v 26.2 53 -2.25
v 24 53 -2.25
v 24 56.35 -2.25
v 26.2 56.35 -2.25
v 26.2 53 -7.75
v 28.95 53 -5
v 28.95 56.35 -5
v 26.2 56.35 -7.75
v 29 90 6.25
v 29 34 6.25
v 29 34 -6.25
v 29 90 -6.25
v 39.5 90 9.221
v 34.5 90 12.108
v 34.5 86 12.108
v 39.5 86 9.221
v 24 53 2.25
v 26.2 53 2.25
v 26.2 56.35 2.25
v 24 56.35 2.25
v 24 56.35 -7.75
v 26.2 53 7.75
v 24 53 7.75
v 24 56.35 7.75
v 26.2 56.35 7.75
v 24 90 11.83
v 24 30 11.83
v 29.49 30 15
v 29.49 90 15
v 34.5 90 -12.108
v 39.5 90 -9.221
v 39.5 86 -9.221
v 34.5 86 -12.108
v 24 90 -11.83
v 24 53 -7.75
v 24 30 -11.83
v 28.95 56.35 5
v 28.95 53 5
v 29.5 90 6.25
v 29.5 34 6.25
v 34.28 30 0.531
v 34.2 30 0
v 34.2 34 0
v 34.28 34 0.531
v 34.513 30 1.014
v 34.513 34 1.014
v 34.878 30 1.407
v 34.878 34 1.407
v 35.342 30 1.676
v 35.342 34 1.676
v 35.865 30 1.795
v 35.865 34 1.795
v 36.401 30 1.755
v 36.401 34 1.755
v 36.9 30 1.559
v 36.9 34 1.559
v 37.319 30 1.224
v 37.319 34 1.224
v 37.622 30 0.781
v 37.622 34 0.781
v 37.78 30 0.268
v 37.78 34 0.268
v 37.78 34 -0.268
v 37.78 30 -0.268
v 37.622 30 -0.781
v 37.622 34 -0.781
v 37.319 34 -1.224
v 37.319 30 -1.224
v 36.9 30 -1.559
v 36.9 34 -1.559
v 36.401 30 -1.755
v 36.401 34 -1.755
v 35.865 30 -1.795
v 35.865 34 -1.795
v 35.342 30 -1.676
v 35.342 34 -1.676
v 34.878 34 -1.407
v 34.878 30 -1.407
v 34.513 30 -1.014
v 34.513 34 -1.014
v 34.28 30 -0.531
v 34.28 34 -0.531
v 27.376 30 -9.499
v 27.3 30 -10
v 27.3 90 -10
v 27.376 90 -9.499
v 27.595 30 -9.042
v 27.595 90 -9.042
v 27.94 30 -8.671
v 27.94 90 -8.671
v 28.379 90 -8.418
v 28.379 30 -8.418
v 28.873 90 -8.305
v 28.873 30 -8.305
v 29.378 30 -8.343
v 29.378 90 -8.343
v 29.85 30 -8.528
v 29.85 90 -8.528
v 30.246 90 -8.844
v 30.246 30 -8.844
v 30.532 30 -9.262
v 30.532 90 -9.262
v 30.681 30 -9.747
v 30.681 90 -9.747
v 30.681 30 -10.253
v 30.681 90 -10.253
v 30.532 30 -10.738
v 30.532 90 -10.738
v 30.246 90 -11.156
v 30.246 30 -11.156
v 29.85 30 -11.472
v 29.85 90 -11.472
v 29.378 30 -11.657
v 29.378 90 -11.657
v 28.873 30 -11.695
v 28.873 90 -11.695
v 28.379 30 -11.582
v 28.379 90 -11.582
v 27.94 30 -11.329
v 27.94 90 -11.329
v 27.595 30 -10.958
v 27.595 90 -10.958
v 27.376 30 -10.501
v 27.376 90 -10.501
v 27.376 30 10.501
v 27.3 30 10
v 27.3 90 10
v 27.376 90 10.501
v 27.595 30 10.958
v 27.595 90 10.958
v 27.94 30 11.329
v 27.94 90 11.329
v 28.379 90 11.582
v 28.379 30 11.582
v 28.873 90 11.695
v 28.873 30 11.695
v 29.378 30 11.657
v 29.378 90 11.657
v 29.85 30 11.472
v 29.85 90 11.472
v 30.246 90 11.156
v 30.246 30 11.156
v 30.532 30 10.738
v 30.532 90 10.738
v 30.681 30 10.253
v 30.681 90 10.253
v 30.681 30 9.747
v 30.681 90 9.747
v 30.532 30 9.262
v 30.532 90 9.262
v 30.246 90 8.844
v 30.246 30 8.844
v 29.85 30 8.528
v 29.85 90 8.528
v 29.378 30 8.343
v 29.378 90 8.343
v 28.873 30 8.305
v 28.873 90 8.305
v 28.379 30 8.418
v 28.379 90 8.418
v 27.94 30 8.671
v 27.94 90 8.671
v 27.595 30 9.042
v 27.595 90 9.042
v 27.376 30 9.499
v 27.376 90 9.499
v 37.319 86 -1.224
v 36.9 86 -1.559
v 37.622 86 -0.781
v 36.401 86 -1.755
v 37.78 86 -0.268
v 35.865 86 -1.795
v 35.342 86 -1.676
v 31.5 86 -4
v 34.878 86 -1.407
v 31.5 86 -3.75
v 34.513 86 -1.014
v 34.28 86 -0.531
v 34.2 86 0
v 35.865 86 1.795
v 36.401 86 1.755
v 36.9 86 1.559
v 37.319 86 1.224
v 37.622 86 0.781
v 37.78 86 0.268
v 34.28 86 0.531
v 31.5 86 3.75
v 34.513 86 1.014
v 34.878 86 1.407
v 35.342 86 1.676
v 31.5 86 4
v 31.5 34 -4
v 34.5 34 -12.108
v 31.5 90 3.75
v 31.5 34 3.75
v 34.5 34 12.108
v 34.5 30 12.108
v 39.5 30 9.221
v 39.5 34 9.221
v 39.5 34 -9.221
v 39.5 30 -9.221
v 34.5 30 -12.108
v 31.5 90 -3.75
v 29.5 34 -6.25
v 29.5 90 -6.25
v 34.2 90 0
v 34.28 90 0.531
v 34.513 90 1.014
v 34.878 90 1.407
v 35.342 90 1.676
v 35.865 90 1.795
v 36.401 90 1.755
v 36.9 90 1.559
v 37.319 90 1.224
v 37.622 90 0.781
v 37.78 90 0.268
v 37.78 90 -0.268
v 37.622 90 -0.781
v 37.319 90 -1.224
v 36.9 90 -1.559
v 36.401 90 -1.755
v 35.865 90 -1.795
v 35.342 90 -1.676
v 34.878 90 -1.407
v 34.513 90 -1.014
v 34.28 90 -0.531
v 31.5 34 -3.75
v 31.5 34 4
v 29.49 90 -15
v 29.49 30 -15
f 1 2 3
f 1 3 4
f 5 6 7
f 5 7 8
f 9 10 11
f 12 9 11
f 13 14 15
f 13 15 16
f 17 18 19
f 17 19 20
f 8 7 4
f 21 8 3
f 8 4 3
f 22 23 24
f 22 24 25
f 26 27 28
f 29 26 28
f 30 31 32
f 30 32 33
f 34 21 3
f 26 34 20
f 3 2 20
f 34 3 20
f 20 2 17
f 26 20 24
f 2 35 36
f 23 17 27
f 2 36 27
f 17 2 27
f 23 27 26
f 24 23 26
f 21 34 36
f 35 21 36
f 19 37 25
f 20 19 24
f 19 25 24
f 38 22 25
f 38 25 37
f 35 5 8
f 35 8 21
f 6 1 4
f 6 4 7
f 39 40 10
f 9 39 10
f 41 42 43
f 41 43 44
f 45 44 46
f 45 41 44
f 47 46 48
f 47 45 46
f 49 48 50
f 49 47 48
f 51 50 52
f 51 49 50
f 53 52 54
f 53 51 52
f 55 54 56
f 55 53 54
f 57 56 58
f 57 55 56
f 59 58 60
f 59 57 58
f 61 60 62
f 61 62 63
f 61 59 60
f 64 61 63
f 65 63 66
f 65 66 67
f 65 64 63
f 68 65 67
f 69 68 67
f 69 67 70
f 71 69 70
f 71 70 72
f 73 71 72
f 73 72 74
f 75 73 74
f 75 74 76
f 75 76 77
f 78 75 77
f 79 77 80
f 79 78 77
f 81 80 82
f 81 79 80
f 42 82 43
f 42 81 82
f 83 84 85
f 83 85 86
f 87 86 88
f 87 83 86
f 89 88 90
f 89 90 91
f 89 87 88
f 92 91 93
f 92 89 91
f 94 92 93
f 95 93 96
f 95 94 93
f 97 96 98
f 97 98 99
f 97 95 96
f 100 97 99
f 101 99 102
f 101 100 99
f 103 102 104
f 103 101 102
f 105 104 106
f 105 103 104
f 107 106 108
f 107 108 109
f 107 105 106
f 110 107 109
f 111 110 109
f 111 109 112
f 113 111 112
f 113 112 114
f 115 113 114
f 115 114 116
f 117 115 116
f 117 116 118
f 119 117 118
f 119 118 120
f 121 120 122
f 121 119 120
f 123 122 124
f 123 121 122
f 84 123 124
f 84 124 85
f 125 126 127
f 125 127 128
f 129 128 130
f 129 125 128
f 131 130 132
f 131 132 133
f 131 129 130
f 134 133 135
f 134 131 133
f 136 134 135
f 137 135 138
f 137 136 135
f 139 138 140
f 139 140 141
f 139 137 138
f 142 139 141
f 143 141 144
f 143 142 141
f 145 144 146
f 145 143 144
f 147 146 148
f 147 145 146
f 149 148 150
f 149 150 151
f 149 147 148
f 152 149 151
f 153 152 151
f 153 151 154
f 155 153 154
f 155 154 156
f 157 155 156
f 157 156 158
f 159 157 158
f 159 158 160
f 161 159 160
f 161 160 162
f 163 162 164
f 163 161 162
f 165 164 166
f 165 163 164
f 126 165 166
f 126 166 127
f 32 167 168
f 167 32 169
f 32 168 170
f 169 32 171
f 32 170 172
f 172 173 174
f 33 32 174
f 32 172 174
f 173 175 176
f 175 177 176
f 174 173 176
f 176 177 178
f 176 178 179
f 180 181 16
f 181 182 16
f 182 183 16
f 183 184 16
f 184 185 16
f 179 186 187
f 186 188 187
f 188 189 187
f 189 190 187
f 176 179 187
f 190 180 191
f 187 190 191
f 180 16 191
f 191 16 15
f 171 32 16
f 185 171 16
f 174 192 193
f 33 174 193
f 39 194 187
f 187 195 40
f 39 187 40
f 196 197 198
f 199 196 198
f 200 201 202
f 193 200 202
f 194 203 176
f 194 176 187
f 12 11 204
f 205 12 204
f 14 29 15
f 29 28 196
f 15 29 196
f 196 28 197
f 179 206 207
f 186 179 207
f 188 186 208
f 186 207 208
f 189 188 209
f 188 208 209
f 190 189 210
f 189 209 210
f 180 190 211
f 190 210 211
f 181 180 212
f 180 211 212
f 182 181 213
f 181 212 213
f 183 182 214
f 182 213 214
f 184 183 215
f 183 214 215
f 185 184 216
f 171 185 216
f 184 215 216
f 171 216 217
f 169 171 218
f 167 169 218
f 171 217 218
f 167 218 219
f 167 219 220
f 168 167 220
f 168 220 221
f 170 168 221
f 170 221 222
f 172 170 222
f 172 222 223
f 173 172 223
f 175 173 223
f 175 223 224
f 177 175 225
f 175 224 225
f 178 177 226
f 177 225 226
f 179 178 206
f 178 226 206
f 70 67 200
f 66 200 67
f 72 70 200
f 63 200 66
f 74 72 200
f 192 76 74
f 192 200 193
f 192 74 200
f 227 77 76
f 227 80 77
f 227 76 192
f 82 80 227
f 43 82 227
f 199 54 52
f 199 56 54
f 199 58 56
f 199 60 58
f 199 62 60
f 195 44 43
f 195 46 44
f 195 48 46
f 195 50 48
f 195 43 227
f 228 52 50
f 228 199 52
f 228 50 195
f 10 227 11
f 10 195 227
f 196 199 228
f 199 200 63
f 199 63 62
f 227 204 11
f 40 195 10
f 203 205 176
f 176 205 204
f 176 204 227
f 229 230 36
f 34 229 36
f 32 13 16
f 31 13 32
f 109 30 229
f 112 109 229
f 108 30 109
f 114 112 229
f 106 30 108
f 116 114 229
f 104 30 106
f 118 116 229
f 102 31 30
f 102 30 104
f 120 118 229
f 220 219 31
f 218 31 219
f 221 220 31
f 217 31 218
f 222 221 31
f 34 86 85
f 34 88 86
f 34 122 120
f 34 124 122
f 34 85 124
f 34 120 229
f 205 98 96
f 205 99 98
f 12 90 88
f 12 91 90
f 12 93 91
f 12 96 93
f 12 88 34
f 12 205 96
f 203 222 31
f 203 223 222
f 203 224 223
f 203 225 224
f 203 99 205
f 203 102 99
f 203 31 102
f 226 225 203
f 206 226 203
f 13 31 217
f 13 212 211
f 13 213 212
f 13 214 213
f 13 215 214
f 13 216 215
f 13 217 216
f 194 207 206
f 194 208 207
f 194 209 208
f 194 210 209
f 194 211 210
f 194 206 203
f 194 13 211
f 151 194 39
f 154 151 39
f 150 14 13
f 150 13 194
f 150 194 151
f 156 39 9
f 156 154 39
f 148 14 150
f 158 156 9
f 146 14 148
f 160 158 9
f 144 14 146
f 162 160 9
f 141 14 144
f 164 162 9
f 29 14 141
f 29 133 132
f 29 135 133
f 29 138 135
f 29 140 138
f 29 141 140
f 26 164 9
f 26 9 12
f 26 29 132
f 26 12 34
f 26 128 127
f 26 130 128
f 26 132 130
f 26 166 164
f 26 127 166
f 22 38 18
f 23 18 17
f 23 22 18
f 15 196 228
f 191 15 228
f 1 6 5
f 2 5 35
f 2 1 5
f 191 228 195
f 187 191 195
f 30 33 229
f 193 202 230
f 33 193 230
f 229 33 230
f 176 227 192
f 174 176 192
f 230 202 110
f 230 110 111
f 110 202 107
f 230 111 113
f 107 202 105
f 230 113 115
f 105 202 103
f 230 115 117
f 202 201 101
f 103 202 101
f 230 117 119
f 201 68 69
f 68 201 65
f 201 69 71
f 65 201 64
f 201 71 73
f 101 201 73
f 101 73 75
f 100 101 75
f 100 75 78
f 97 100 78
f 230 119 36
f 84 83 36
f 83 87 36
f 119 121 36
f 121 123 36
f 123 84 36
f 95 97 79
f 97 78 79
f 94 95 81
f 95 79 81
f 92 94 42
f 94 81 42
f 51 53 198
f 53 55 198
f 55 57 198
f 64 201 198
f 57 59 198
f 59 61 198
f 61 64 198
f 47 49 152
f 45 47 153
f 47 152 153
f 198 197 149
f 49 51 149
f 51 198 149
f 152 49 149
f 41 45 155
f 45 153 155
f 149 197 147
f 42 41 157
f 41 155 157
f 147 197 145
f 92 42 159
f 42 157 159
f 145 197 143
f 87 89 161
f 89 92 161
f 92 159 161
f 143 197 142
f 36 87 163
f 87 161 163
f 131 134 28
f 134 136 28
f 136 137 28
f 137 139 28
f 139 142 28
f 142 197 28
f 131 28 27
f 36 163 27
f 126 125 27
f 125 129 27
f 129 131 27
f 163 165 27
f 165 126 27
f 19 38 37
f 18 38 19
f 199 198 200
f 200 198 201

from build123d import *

# Parameters (mm, degrees)
SKETCH161_R  = 1.8
PAD126_DEPTH = 3.35
SKETCH158_R  = 1.8
PAD123_DEPTH = 4
SKETCH159_R  = 1.8
SKETCH159_W  = 2.5
SKETCH159_H  = 13
PAD124_DEPTH = 4
SKETCH156_R  = 1.7
PAD121_DEPTH = 60


with BuildPart() as motorcageringcutout:
    # Sketch161 → Pad126 (new body)
    with BuildSketch(Plane.XZ.offset(-53)):
        with BuildLine():
            Line((-16.85, 24), (-23.5, 12.481862))
            Line((-23.5, 12.481862), (-23.5, 7.75))
            Line((-23.5, 7.75), (-26.2, 7.75))
            Line((-26.2, 7.75), (-28.95, 5))
            Line((-28.95, 5), (-26.2, 2.25))
            Line((-26.2, 2.25), (-23.5, 2.25))
            Line((-23.5, 2.25), (-23.5, -2.25))
            Line((-23.5, -2.25), (-26.2, -2.25))
            Line((-26.2, -2.25), (-28.95, -5))
            Line((-28.95, -5), (-26.2, -7.75))
            Line((-26.2, -7.75), (-23.5, -7.75))
            Line((-23.5, -7.75), (-23.5, -12.473721))
            Line((-23.5, -12.473721), (-18, -22))
            Line((-18, -22), (0, -22))
            Line((0, -18.35), (0, -22))
            ThreePointArc((0, 18.35), (-18.35, 0), (0, -18.35))
            Line((0, 24), (0, 18.35))
            Line((-16.85, 24), (0, 24))
        make_face()
        with Locations((-15, 21)):
            Circle(SKETCH161_R, mode=Mode.SUBTRACT)
        with Locations((-15, -17)):
            Circle(SKETCH161_R, mode=Mode.SUBTRACT)
    extrude(amount=-PAD126_DEPTH)


with BuildPart() as endcap:
    # Sketch158 → Pad123 (new body)
    with BuildSketch(Plane.XZ.offset(-30)):
        Polygon((-29.490381, 15), (-39.5, 9.220944), (-39.5, -9.220944), (-29.490381, -15), (-24, -11.830127), (-24, 11.830127), align=None)
        with Locations((-29, 10)):
            Circle(SKETCH158_R, mode=Mode.SUBTRACT)
        with Locations((-29, -10)):
            Circle(SKETCH158_R, mode=Mode.SUBTRACT)
        with Locations((-36, 0)):
            Circle(SKETCH158_R, mode=Mode.SUBTRACT)
    extrude(amount=-PAD123_DEPTH)


with BuildPart() as pad124:
    # Sketch159 → Pad124 (new body)
    with BuildSketch(Plane.XZ.offset(-90)):
        Polygon((-29.490381, 15), (-39.5, 9.220944), (-39.5, -9.220944), (-29.490381, -15), (-24, -11.830127), (-24, 11.830127), align=None)
        with Locations((-29, 10)):
            Circle(SKETCH159_R, mode=Mode.SUBTRACT)
        with Locations((-29, -10)):
            Circle(SKETCH159_R, mode=Mode.SUBTRACT)
        with Locations((-36, 0)):
            Circle(SKETCH159_R, mode=Mode.SUBTRACT)
        with Locations((-30.25, 0)):
            Rectangle(SKETCH159_W, SKETCH159_H, mode=Mode.SUBTRACT)
    extrude(amount=PAD124_DEPTH)


with BuildPart() as sidewall:
    # Sketch156 → Pad121 (new body)
    with BuildSketch(Plane.XZ.offset(-30)):
        Polygon((-29.490381, 15), (-34.5, 12.107695), (-31.5, 4), (-31.5, 3.75), (-29.5, 6.25), (-29, 6.25), (-29, -6.25), (-29.5, -6.25), (-31.5, -3.75), (-31.5, -4), (-34.5, -12.107695), (-29.490381, -15), (-24, -11.830127), (-24, 11.830127), align=None)
        with Locations((-29, 10)):
            Circle(SKETCH156_R, mode=Mode.SUBTRACT)
        with Locations((-29, -10)):
            Circle(SKETCH156_R, mode=Mode.SUBTRACT)
    extrude(amount=-PAD121_DEPTH)

    # Fusion004020009: union EndCap, Pad124
    add(endcap.part)
    add(pad124.part)

    # Cut007019014: cut MotorCageRingCutout
    add(motorcageringcutout.part, mode=Mode.SUBTRACT)


with BuildPart() as part_mirroring018:
    # Part__Mirroring018: instance of SideWall
    add(sidewall.part.mirror(Plane(origin=(0, 0, 0), x_dir=(0, -1, 0), z_dir=(1, 0, 0))))


solid = part_mirroring018.part
